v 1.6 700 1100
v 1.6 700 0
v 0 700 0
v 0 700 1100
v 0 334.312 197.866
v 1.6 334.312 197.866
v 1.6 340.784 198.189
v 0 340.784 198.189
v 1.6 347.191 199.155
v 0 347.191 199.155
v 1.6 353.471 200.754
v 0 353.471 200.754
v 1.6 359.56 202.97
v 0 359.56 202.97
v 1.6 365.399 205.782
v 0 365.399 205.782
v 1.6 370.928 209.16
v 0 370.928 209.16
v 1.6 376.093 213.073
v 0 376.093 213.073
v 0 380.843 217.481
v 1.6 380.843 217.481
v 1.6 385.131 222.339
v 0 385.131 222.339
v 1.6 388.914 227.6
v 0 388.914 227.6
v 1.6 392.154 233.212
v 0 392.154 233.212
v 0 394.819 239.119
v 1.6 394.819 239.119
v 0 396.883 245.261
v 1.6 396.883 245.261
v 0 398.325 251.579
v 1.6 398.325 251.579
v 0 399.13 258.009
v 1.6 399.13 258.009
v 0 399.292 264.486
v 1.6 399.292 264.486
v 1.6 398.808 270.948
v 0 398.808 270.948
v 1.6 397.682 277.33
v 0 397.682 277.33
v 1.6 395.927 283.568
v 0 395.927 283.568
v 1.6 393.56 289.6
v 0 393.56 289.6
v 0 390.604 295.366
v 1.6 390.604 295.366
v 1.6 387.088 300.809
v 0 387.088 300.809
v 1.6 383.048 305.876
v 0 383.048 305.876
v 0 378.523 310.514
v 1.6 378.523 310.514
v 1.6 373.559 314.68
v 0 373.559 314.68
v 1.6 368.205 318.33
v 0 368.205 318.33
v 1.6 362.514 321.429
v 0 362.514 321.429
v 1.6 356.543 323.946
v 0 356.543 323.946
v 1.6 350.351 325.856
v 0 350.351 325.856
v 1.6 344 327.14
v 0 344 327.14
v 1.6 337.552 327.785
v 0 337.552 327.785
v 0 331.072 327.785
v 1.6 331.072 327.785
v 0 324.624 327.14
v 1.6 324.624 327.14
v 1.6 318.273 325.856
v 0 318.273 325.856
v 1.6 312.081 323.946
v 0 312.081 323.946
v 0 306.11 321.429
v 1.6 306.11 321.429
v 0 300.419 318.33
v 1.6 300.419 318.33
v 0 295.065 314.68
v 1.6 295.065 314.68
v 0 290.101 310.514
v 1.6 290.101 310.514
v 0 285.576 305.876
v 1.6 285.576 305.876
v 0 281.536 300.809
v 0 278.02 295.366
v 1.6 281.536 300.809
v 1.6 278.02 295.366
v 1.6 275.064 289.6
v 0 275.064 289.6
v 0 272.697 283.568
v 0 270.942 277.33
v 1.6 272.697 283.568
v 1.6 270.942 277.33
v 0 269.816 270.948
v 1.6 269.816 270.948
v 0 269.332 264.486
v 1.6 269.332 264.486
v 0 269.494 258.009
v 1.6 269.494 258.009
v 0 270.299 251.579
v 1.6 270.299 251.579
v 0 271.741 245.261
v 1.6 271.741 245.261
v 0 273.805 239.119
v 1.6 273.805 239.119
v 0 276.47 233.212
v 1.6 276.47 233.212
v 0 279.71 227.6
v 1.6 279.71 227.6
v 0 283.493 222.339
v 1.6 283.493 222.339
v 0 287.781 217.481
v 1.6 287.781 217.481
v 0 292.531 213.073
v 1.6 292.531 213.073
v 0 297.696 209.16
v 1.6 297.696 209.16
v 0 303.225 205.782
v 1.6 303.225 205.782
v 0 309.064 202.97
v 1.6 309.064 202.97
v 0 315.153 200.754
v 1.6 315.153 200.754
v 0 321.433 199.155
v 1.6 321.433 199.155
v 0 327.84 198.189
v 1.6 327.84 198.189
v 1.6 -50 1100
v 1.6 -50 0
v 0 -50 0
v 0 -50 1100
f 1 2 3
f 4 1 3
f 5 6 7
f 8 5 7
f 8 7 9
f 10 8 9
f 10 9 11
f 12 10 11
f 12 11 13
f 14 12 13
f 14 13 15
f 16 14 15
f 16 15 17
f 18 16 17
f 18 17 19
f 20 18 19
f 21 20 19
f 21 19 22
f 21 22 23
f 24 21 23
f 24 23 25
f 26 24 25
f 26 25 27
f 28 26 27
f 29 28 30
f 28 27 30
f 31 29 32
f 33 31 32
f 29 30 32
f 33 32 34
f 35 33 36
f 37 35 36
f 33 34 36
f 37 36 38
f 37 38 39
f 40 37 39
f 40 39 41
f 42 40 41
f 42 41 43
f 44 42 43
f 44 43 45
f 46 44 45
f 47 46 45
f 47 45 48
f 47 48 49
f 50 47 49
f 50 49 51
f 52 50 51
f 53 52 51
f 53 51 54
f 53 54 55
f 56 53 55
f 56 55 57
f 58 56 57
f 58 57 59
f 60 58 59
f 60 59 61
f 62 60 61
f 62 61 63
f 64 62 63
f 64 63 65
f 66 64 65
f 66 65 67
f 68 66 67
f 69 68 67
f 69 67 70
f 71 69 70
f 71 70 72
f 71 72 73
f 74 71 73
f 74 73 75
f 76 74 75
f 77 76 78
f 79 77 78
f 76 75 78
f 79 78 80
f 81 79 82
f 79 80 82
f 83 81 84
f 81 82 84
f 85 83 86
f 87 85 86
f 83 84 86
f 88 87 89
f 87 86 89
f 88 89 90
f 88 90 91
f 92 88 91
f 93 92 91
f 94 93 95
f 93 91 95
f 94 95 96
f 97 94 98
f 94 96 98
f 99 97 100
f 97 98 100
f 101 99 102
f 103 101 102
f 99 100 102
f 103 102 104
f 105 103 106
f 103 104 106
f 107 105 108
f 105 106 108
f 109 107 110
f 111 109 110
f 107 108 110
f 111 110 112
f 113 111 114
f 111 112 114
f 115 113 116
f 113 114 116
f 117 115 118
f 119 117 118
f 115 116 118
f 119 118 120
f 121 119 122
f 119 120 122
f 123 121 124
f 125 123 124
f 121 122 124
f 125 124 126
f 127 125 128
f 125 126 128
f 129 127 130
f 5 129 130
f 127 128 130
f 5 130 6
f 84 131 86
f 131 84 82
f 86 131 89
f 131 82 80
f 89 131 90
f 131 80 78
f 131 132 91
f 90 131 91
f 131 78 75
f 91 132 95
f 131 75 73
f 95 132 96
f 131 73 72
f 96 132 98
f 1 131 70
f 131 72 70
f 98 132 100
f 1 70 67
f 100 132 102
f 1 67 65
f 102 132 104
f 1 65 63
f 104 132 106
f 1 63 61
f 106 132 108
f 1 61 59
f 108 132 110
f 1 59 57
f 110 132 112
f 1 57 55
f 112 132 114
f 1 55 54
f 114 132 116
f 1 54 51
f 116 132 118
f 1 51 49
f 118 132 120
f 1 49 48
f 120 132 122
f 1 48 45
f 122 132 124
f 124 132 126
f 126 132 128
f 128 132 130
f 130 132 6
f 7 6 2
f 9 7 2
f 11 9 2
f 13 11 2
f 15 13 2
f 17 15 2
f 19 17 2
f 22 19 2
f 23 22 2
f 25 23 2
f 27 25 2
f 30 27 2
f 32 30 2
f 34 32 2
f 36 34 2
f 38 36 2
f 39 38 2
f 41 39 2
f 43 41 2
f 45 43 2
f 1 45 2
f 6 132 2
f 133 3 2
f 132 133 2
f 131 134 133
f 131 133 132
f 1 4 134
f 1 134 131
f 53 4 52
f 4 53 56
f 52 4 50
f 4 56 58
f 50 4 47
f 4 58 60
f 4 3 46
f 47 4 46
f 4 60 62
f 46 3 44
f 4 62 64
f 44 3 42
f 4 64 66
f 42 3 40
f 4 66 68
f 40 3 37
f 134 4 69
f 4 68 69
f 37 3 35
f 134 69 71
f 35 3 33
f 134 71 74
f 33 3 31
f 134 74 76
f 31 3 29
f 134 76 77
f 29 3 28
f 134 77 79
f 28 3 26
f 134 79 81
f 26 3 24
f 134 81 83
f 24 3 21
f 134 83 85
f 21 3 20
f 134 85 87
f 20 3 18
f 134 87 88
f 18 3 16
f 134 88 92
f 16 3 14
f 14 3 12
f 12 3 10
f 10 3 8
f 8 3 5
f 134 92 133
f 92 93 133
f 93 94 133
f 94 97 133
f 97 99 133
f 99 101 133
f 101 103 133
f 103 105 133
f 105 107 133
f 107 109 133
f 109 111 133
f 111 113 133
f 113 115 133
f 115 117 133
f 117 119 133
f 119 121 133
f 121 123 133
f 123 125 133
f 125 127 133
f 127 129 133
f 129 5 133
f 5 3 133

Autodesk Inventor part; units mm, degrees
ref_plane "YZ Plane" through (0, 0, 0) normal (1, 0, 0) x (0, 1, 0)
ref_plane "XZ Plane" through (0, 0, 0) normal (0, 1, 0) x (-1, 0, 0)
ref_plane "XY Plane" through (0, 0, 0) normal (0, 0, 1) x (1, 0, 0)
sketch "Sketch1" plane through (0, 0, 0) normal (0, 0, 1) x (1, 0, 0)
  line L0 (0, 0) -> (1.6, 0)
  line L1 (1.6, 0) -> (1.6, 700)
  line L2 (1.6, 700) -> (0, 700)
  line L3 (0, 700) -> (0, 0)
  dimension "d0" = 700
  dimension "d1" = 1.6
extrude "Extrusion1" add sketch "Sketch1" along normal blind 1100
sketch "Sketch2" plane through (1.6, 0, 0) normal (0, -1, 0) x (1, 0, 0)
  line L0 (-1.6, 0) -> (-1.6, 1100) projected
  line L1 (-1.6, 0) -> (0, 0) projected
  line L2 (-1.6, 0) -> (0, 0) projected
  line L3 (0, 0) -> (0, 1100) projected
  line L4 (-1.6, 1100) -> (0, 1100) projected
  line L5 (-1.6, 0) -> (-1.6, 1100) projected
extrude "Extrusion2" add sketch "Sketch2" along normal blind 50
sketch "Sketch3" plane through (1.6, 700, 1100) normal (1, 0, 0) x (0, 0, -1)
  line L0 (1100, 0) -> (1100, -750) projected
  line L1 (1100, -427.9985) -> (1362.866, -427.9985) construction
  line L2 (0, -750) -> (1100, -750) projected
  circle A0 centre (837.134, -365.688) radius 65
  point P0 (1100, -700)
extrude "Extrusion3" cut sketch "Sketch3" against normal through all
properties part number "cover 2"
